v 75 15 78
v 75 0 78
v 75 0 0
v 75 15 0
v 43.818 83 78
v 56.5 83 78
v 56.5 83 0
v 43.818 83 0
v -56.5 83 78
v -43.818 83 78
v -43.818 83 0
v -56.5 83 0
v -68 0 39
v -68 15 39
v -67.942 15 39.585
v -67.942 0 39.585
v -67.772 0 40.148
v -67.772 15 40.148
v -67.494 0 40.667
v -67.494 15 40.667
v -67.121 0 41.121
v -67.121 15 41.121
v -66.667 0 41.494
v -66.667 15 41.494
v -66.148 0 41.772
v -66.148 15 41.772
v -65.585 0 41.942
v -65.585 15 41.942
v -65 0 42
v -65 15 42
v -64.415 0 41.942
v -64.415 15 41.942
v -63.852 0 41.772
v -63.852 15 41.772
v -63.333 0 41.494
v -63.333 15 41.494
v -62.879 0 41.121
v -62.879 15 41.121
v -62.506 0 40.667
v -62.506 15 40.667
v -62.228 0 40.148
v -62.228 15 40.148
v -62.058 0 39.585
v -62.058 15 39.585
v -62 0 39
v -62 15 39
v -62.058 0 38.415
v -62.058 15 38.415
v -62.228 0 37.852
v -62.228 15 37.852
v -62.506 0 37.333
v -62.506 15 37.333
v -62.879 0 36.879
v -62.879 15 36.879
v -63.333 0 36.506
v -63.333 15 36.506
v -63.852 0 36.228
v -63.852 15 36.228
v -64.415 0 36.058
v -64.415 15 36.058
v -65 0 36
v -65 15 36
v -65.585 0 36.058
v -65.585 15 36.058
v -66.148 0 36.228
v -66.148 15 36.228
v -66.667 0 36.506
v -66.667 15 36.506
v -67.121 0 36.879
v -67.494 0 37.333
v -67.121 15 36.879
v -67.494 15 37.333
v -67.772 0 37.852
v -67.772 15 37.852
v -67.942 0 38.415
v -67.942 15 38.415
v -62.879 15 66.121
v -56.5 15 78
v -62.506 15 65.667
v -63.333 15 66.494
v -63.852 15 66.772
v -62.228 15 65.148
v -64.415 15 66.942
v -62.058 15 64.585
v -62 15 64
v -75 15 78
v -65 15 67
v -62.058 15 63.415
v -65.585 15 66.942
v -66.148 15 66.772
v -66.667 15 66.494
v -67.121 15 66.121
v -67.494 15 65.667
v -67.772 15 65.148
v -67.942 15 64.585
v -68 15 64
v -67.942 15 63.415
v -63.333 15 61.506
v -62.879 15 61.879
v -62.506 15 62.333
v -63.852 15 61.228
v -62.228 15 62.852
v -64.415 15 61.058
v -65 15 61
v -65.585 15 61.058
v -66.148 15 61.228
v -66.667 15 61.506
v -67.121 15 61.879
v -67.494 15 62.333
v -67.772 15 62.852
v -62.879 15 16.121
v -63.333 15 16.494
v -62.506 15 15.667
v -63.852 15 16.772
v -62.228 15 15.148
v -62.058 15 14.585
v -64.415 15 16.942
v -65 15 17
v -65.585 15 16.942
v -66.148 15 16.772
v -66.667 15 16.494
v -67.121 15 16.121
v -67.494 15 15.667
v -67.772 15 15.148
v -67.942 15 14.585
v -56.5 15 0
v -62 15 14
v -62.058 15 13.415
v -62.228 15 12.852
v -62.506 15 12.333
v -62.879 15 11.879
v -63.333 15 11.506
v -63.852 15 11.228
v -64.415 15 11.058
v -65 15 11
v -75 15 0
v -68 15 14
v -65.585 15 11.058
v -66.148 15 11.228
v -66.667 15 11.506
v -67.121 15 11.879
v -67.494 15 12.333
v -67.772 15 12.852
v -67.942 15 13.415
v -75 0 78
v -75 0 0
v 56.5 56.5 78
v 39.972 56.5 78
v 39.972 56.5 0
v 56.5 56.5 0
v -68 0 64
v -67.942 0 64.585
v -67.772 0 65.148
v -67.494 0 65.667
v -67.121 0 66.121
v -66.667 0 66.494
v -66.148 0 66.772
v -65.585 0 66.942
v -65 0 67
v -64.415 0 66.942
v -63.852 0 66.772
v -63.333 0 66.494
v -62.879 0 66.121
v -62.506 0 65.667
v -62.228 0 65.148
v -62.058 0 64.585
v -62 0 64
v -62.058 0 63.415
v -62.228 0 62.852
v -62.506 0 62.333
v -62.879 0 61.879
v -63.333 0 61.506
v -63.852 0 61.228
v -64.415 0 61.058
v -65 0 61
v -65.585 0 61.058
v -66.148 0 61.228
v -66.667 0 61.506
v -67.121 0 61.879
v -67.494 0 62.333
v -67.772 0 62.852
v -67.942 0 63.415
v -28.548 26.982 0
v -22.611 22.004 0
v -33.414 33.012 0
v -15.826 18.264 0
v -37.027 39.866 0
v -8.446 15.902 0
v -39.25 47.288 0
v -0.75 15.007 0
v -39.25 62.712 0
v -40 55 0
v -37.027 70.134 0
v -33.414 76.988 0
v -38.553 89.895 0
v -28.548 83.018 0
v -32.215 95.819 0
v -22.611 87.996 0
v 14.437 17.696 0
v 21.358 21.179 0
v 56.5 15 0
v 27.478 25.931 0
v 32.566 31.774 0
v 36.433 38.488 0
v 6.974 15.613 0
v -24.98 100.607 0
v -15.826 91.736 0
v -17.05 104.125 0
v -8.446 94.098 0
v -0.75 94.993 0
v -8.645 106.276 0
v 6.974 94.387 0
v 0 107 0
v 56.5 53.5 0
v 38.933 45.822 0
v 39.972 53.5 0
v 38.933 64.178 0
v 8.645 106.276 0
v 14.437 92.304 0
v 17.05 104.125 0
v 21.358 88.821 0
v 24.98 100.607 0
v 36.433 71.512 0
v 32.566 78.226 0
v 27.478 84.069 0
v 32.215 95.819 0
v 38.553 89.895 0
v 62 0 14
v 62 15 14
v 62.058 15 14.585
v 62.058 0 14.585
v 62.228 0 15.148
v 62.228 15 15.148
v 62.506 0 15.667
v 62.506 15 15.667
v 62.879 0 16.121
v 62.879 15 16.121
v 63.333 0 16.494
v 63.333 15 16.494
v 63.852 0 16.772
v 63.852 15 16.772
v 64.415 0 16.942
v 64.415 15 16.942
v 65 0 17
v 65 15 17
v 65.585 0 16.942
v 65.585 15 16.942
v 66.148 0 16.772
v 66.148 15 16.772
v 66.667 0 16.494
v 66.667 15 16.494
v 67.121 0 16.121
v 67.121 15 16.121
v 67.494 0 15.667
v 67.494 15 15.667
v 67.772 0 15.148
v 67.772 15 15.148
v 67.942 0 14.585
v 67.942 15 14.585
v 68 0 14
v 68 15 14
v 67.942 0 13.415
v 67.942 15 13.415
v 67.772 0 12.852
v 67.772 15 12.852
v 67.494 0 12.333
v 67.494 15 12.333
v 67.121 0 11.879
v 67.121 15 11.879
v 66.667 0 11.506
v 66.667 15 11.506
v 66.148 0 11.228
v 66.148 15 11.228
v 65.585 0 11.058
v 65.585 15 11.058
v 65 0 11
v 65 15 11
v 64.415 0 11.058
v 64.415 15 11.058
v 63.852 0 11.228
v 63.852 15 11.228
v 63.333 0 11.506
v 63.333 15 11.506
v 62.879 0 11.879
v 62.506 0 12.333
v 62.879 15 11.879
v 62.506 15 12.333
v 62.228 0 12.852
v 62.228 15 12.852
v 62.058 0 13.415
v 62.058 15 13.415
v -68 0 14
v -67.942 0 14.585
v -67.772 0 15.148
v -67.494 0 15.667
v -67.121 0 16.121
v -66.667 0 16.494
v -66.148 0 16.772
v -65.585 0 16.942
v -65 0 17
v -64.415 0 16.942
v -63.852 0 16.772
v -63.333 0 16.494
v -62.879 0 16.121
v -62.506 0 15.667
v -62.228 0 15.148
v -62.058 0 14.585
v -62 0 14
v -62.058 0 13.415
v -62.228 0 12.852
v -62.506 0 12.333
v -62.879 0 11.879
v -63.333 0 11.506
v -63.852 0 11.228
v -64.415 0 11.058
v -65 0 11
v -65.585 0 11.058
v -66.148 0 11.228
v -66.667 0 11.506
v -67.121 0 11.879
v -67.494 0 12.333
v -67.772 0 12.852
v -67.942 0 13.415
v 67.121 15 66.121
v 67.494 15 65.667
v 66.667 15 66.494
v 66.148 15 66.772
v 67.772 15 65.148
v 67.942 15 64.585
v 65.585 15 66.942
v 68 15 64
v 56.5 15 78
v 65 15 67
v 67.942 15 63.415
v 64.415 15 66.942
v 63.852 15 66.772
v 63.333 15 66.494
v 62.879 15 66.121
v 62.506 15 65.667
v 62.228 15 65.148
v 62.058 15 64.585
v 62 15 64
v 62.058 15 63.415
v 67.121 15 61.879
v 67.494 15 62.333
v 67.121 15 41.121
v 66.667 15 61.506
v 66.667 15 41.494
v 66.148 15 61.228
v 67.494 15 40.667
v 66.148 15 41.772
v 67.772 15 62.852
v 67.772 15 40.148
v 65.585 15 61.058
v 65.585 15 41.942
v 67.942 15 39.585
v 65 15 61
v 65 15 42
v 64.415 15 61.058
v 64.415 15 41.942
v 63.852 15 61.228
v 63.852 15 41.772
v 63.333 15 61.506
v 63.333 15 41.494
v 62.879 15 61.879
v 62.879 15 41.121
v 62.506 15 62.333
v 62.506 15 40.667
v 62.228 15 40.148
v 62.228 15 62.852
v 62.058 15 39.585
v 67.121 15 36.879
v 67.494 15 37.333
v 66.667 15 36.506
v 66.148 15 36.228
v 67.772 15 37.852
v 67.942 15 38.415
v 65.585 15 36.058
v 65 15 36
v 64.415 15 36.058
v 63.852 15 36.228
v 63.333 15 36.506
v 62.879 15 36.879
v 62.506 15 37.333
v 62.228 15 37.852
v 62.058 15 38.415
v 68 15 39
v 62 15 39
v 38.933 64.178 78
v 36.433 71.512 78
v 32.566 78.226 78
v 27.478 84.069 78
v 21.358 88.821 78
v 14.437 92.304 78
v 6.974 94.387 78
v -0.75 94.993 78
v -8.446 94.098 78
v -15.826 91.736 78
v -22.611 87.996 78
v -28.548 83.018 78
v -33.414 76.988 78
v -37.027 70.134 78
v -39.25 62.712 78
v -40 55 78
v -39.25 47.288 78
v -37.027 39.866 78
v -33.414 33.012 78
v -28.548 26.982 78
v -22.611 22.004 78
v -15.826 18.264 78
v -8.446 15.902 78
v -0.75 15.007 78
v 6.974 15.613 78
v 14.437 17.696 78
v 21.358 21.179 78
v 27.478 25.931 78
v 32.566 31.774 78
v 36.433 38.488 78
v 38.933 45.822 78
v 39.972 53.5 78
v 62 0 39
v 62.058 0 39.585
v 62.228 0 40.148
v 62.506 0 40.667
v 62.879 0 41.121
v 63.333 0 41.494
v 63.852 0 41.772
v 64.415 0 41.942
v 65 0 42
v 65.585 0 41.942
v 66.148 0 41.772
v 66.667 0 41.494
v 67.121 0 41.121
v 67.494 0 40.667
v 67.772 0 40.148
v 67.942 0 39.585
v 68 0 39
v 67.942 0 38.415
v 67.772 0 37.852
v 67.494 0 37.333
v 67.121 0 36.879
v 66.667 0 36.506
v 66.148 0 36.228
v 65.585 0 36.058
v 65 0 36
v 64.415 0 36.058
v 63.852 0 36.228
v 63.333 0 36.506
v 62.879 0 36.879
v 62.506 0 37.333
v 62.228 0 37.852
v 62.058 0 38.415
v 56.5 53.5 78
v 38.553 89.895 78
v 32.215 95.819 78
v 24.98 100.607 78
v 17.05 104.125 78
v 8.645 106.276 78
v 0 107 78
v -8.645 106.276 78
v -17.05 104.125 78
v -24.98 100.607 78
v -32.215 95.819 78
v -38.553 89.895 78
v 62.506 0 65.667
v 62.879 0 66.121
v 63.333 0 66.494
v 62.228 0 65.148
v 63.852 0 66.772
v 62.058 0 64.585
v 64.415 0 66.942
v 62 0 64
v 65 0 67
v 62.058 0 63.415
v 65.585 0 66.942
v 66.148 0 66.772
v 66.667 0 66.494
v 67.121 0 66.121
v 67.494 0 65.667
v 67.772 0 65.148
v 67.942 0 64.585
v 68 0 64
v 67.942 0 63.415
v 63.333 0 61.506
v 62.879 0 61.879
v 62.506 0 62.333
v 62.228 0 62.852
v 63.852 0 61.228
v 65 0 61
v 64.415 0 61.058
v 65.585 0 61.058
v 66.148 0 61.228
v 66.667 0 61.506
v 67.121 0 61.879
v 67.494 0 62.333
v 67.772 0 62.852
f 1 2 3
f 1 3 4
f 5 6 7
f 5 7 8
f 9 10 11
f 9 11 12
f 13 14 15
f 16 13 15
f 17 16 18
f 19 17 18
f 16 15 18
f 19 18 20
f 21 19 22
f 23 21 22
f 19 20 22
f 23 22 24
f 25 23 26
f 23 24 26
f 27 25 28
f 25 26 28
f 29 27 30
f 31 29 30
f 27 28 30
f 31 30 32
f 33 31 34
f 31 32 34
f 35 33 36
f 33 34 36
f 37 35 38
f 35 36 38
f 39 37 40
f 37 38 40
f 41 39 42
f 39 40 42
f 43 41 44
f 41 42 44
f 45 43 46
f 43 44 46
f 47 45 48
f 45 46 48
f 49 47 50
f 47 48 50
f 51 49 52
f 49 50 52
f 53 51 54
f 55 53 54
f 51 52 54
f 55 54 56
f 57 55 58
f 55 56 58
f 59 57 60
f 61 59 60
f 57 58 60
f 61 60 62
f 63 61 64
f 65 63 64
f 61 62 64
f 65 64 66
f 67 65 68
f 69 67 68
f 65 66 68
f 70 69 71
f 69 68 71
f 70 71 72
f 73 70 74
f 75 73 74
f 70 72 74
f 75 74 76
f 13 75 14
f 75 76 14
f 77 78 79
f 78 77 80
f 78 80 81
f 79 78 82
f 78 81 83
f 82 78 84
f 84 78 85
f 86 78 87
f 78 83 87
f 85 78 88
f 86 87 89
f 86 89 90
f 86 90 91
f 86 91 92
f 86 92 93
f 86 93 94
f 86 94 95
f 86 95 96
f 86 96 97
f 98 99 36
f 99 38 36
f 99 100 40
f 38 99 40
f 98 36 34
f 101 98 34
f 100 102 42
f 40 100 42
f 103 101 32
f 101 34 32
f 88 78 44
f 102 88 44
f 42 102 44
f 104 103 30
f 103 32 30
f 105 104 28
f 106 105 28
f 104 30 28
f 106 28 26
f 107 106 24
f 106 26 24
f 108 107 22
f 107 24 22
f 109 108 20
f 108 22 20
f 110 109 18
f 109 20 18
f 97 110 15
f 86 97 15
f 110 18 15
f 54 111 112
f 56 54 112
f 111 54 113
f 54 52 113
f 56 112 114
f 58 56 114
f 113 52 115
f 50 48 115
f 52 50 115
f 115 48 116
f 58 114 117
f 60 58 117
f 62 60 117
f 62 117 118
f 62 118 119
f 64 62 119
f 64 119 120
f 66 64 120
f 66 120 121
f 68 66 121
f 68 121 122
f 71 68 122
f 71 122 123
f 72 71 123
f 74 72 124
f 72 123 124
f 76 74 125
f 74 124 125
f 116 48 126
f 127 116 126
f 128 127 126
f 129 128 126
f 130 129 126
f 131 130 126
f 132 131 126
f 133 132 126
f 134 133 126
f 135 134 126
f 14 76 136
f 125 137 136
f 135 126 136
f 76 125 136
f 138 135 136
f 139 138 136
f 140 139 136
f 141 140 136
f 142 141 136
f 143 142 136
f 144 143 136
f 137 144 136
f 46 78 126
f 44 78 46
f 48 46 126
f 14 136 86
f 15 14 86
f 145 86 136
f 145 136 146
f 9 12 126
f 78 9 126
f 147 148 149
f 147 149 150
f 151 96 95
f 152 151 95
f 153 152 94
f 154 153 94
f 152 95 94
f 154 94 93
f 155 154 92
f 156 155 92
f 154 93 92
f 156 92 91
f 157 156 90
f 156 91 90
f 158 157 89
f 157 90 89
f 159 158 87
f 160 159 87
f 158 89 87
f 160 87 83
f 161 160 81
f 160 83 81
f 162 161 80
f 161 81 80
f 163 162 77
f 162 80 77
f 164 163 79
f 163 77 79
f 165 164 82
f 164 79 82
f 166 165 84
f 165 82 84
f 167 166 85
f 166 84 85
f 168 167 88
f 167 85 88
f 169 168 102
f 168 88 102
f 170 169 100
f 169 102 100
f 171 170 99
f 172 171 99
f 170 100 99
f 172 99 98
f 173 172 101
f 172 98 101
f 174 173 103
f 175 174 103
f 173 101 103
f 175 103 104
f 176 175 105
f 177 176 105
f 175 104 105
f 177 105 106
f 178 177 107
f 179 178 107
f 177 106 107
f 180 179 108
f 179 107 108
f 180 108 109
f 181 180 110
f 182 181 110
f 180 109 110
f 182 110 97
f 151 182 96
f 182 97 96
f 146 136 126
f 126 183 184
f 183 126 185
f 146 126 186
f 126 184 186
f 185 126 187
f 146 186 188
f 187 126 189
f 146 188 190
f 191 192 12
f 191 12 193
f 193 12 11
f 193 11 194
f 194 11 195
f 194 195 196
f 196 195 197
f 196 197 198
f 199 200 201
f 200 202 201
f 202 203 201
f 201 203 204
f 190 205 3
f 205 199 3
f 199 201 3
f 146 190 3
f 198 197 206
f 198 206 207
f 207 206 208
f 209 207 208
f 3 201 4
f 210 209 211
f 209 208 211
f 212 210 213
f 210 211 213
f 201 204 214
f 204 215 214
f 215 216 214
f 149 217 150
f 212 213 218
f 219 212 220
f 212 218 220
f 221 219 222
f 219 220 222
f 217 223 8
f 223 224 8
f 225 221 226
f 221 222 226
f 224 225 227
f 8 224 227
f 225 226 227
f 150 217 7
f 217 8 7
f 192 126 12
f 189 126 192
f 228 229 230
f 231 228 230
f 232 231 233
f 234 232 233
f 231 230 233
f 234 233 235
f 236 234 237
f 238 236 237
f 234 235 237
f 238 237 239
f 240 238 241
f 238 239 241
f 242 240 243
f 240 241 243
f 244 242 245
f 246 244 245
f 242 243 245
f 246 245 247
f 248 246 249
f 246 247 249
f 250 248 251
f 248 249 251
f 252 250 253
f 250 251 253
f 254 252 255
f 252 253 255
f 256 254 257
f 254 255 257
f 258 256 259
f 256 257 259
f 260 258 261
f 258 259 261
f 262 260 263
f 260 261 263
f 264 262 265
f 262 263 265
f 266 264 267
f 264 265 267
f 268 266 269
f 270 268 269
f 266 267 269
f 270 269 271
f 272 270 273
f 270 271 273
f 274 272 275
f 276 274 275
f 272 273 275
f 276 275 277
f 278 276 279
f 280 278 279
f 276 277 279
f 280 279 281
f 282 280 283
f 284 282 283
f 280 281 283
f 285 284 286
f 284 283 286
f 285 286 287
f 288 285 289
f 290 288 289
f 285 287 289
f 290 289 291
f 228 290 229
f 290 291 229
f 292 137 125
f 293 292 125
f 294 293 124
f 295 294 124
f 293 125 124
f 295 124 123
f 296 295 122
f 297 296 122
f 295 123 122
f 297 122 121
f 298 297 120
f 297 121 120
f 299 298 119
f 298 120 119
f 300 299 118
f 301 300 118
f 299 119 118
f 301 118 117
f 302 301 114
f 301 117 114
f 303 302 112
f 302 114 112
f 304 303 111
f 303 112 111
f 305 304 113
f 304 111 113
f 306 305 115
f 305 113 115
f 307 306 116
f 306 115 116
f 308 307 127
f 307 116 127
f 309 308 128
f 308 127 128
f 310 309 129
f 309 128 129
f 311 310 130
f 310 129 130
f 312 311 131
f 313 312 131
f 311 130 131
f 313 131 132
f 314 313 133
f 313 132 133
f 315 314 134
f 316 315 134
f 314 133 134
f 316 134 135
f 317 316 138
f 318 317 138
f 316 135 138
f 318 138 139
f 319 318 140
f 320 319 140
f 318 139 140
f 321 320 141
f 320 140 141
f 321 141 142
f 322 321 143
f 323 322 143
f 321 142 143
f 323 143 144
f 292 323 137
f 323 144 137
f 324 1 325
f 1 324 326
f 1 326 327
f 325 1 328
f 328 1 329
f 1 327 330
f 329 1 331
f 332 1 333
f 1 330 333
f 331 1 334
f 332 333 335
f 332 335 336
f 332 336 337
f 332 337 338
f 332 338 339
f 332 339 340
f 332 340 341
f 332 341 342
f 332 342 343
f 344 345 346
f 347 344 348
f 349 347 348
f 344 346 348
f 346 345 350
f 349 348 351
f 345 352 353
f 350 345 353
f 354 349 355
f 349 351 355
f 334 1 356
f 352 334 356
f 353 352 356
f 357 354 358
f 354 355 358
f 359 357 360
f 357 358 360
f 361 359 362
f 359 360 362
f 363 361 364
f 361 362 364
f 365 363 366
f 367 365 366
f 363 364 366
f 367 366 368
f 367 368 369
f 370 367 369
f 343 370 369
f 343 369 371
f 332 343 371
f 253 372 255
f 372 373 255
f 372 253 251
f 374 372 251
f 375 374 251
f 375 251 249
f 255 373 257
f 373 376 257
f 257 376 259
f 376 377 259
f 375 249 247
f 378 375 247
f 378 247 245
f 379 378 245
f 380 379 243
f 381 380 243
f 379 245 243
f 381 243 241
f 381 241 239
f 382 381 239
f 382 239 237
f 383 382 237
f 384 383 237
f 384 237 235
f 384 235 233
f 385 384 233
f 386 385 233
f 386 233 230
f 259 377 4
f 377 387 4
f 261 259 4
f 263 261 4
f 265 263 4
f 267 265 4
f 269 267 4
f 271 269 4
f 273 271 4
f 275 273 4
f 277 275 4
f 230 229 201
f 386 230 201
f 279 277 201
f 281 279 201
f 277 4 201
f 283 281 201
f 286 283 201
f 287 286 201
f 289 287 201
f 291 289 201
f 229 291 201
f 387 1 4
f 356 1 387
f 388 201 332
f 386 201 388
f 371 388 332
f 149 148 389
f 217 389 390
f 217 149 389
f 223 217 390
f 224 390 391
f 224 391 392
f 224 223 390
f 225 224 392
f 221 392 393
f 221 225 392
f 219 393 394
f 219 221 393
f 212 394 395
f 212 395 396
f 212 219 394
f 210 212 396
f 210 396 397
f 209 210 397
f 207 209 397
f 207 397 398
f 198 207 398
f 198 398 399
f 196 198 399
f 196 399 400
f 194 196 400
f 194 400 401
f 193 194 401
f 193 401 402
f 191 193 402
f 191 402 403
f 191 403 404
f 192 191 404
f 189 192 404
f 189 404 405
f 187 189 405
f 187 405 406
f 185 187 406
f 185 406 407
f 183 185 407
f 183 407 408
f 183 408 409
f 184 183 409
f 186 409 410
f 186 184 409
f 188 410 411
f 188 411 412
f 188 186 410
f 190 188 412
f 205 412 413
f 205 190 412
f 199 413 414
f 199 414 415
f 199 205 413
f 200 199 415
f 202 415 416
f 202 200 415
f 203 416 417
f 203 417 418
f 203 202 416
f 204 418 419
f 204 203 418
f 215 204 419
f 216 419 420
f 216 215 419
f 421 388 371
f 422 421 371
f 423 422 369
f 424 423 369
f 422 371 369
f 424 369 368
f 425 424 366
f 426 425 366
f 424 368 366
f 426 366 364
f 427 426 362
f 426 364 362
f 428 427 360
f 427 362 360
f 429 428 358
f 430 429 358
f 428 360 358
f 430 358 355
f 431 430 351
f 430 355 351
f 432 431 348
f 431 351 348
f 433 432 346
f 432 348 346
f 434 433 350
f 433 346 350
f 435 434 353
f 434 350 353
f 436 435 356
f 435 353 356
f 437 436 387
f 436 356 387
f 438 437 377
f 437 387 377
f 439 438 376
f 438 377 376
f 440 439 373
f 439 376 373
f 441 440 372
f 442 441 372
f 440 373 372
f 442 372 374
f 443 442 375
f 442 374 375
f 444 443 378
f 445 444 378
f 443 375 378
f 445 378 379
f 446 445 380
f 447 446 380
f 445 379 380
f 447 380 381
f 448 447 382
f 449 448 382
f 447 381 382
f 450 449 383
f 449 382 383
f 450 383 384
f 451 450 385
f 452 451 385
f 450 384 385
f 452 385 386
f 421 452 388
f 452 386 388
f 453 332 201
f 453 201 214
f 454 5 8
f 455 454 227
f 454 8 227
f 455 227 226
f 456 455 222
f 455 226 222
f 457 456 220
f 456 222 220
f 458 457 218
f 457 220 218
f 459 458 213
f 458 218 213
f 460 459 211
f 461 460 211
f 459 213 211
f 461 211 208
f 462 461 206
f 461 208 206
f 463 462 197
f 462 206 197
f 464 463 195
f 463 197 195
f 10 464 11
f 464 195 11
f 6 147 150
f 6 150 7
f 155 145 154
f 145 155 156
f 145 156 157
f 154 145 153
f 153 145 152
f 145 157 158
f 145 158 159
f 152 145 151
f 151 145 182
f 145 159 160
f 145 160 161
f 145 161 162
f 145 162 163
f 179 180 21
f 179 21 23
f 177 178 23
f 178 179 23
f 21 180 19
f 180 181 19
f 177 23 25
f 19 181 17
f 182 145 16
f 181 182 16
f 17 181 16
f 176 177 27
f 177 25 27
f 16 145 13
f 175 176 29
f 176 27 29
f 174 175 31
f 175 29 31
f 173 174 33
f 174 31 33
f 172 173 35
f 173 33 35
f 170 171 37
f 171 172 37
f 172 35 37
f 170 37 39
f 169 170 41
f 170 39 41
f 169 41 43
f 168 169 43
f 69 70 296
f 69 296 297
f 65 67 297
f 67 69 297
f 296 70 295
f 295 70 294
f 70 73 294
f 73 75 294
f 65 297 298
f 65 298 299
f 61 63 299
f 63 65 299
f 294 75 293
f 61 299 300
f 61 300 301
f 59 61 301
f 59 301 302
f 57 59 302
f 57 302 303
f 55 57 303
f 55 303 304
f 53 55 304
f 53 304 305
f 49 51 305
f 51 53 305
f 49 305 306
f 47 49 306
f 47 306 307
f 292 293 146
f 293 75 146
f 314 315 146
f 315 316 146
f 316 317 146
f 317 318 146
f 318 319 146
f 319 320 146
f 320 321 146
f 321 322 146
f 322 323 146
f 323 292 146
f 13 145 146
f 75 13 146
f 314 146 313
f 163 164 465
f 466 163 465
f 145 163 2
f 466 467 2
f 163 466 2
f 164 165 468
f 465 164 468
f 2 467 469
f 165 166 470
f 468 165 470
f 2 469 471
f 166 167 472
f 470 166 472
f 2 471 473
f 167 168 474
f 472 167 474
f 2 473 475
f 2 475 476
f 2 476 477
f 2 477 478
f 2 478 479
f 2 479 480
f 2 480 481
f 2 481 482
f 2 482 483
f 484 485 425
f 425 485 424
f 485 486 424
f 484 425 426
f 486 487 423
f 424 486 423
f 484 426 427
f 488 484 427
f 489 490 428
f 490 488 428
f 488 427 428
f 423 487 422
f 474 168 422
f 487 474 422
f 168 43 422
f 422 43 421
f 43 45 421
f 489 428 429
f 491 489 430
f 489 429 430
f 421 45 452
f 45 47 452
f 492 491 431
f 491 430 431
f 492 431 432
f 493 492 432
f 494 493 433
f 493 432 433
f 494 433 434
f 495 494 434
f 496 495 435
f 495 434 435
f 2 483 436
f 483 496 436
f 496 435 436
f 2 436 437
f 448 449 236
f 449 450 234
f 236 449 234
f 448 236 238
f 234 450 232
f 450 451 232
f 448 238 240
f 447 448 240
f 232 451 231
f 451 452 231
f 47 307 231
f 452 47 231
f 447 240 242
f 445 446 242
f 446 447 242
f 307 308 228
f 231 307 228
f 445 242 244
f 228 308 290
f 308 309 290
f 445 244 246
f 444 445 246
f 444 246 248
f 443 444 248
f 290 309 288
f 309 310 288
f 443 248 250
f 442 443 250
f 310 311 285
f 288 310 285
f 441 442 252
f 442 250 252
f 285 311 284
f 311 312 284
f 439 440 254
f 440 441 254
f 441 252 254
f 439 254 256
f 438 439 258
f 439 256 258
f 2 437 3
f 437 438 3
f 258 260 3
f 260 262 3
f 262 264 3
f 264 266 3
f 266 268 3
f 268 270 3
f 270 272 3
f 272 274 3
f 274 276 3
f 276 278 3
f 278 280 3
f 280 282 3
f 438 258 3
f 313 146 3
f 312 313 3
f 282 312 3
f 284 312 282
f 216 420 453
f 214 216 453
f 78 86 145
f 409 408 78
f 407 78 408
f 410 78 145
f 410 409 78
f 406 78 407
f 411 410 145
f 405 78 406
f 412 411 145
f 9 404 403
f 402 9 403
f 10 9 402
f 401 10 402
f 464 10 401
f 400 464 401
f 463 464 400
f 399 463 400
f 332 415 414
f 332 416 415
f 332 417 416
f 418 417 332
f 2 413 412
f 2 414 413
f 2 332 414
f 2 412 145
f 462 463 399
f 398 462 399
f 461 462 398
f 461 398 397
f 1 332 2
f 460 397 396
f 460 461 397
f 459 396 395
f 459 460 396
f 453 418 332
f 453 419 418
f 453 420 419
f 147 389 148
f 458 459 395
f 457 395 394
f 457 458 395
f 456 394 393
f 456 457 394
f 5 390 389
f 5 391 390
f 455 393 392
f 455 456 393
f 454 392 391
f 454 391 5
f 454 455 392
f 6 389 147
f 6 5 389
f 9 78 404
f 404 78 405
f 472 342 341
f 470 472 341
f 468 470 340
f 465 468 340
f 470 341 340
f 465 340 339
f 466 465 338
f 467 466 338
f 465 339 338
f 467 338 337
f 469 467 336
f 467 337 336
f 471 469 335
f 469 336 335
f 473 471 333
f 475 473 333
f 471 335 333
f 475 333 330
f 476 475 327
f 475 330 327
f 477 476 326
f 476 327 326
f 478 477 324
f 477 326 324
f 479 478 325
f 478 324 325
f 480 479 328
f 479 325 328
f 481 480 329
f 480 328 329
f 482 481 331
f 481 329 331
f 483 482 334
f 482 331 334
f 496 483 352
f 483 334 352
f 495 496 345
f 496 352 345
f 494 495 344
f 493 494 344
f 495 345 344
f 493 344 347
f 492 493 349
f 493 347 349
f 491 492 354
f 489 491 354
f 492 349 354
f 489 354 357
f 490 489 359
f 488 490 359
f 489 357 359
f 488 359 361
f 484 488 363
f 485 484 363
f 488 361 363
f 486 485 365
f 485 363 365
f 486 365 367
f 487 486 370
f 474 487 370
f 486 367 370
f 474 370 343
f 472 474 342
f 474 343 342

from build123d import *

# Parameters (mm, degrees)
ESQUISSE1_R             = 40
BOSS_EXTRU_1_DEPTH      = 78
ESQUISSE2_W             = 36.5
ESQUISSE2_H             = 3
ENL_V_MAT_EXTRU_1_DEPTH = 78
ESQUISSE3_R             = 3
ENL_V_MAT_EXTRU_2_DEPTH = 15


with BuildPart() as part:
    # Esquisse1 → Boss.-Extru.1 (new body)
    with BuildSketch(Plane.XY):
        with BuildLine():
            Line((-75, 0), (75, 0))
            Line((75, 0), (75, 15))
            Line((75, 15), (56.5, 15))
            Line((56.5, 15), (56.5, 83))
            Line((56.5, 83), (43.8178046, 83))
            ThreePointArc((43.8178046, 83), (0, 107), (-43.8178046, 83))
            Line((-43.8178046, 83), (-56.5, 83))
            Line((-56.5, 83), (-56.5, 15))
            Line((-56.5, 15), (-75, 15))
            Line((-75, 15), (-75, 0))
        make_face()
        with Locations((0, 55)):
            Circle(ESQUISSE1_R, mode=Mode.SUBTRACT)
    extrude(amount=BOSS_EXTRU_1_DEPTH)

    # Esquisse2 → Enlèv. mat.-Extru.1 (cut)
    with BuildSketch(Plane.XY.offset(78)):
        with Locations((38.25, 55)):
            Rectangle(ESQUISSE2_W, ESQUISSE2_H)
    extrude(amount=-ENL_V_MAT_EXTRU_1_DEPTH, mode=Mode.SUBTRACT)

    # Esquisse3 → Enlèv. mat.-Extru.2 (cut)
    with BuildSketch(Plane(origin=(0, 15, 0), x_dir=(1, 0, 0), z_dir=(0, 1, 0))):
        with Locations(Location((-65, -39, 0), (0, 0, 180))):
            Circle(ESQUISSE3_R)
        with Locations(Location((-65, -14, 0), (0, 0, 180))):
            Circle(ESQUISSE3_R)
        with Locations(Location((-65, -64, 0), (0, 0, 180))):
            Circle(ESQUISSE3_R)
        with Locations(Location((65, -64, 0), (0, 0, 180))):
            Circle(ESQUISSE3_R)
        with Locations(Location((65, -14, 0), (0, 0, 180))):
            Circle(ESQUISSE3_R)
        with Locations(Location((65, -39, 0), (0, 0, 180))):
            Circle(ESQUISSE3_R)
    extrude(amount=-ENL_V_MAT_EXTRU_2_DEPTH, mode=Mode.SUBTRACT)


solid = part.part
